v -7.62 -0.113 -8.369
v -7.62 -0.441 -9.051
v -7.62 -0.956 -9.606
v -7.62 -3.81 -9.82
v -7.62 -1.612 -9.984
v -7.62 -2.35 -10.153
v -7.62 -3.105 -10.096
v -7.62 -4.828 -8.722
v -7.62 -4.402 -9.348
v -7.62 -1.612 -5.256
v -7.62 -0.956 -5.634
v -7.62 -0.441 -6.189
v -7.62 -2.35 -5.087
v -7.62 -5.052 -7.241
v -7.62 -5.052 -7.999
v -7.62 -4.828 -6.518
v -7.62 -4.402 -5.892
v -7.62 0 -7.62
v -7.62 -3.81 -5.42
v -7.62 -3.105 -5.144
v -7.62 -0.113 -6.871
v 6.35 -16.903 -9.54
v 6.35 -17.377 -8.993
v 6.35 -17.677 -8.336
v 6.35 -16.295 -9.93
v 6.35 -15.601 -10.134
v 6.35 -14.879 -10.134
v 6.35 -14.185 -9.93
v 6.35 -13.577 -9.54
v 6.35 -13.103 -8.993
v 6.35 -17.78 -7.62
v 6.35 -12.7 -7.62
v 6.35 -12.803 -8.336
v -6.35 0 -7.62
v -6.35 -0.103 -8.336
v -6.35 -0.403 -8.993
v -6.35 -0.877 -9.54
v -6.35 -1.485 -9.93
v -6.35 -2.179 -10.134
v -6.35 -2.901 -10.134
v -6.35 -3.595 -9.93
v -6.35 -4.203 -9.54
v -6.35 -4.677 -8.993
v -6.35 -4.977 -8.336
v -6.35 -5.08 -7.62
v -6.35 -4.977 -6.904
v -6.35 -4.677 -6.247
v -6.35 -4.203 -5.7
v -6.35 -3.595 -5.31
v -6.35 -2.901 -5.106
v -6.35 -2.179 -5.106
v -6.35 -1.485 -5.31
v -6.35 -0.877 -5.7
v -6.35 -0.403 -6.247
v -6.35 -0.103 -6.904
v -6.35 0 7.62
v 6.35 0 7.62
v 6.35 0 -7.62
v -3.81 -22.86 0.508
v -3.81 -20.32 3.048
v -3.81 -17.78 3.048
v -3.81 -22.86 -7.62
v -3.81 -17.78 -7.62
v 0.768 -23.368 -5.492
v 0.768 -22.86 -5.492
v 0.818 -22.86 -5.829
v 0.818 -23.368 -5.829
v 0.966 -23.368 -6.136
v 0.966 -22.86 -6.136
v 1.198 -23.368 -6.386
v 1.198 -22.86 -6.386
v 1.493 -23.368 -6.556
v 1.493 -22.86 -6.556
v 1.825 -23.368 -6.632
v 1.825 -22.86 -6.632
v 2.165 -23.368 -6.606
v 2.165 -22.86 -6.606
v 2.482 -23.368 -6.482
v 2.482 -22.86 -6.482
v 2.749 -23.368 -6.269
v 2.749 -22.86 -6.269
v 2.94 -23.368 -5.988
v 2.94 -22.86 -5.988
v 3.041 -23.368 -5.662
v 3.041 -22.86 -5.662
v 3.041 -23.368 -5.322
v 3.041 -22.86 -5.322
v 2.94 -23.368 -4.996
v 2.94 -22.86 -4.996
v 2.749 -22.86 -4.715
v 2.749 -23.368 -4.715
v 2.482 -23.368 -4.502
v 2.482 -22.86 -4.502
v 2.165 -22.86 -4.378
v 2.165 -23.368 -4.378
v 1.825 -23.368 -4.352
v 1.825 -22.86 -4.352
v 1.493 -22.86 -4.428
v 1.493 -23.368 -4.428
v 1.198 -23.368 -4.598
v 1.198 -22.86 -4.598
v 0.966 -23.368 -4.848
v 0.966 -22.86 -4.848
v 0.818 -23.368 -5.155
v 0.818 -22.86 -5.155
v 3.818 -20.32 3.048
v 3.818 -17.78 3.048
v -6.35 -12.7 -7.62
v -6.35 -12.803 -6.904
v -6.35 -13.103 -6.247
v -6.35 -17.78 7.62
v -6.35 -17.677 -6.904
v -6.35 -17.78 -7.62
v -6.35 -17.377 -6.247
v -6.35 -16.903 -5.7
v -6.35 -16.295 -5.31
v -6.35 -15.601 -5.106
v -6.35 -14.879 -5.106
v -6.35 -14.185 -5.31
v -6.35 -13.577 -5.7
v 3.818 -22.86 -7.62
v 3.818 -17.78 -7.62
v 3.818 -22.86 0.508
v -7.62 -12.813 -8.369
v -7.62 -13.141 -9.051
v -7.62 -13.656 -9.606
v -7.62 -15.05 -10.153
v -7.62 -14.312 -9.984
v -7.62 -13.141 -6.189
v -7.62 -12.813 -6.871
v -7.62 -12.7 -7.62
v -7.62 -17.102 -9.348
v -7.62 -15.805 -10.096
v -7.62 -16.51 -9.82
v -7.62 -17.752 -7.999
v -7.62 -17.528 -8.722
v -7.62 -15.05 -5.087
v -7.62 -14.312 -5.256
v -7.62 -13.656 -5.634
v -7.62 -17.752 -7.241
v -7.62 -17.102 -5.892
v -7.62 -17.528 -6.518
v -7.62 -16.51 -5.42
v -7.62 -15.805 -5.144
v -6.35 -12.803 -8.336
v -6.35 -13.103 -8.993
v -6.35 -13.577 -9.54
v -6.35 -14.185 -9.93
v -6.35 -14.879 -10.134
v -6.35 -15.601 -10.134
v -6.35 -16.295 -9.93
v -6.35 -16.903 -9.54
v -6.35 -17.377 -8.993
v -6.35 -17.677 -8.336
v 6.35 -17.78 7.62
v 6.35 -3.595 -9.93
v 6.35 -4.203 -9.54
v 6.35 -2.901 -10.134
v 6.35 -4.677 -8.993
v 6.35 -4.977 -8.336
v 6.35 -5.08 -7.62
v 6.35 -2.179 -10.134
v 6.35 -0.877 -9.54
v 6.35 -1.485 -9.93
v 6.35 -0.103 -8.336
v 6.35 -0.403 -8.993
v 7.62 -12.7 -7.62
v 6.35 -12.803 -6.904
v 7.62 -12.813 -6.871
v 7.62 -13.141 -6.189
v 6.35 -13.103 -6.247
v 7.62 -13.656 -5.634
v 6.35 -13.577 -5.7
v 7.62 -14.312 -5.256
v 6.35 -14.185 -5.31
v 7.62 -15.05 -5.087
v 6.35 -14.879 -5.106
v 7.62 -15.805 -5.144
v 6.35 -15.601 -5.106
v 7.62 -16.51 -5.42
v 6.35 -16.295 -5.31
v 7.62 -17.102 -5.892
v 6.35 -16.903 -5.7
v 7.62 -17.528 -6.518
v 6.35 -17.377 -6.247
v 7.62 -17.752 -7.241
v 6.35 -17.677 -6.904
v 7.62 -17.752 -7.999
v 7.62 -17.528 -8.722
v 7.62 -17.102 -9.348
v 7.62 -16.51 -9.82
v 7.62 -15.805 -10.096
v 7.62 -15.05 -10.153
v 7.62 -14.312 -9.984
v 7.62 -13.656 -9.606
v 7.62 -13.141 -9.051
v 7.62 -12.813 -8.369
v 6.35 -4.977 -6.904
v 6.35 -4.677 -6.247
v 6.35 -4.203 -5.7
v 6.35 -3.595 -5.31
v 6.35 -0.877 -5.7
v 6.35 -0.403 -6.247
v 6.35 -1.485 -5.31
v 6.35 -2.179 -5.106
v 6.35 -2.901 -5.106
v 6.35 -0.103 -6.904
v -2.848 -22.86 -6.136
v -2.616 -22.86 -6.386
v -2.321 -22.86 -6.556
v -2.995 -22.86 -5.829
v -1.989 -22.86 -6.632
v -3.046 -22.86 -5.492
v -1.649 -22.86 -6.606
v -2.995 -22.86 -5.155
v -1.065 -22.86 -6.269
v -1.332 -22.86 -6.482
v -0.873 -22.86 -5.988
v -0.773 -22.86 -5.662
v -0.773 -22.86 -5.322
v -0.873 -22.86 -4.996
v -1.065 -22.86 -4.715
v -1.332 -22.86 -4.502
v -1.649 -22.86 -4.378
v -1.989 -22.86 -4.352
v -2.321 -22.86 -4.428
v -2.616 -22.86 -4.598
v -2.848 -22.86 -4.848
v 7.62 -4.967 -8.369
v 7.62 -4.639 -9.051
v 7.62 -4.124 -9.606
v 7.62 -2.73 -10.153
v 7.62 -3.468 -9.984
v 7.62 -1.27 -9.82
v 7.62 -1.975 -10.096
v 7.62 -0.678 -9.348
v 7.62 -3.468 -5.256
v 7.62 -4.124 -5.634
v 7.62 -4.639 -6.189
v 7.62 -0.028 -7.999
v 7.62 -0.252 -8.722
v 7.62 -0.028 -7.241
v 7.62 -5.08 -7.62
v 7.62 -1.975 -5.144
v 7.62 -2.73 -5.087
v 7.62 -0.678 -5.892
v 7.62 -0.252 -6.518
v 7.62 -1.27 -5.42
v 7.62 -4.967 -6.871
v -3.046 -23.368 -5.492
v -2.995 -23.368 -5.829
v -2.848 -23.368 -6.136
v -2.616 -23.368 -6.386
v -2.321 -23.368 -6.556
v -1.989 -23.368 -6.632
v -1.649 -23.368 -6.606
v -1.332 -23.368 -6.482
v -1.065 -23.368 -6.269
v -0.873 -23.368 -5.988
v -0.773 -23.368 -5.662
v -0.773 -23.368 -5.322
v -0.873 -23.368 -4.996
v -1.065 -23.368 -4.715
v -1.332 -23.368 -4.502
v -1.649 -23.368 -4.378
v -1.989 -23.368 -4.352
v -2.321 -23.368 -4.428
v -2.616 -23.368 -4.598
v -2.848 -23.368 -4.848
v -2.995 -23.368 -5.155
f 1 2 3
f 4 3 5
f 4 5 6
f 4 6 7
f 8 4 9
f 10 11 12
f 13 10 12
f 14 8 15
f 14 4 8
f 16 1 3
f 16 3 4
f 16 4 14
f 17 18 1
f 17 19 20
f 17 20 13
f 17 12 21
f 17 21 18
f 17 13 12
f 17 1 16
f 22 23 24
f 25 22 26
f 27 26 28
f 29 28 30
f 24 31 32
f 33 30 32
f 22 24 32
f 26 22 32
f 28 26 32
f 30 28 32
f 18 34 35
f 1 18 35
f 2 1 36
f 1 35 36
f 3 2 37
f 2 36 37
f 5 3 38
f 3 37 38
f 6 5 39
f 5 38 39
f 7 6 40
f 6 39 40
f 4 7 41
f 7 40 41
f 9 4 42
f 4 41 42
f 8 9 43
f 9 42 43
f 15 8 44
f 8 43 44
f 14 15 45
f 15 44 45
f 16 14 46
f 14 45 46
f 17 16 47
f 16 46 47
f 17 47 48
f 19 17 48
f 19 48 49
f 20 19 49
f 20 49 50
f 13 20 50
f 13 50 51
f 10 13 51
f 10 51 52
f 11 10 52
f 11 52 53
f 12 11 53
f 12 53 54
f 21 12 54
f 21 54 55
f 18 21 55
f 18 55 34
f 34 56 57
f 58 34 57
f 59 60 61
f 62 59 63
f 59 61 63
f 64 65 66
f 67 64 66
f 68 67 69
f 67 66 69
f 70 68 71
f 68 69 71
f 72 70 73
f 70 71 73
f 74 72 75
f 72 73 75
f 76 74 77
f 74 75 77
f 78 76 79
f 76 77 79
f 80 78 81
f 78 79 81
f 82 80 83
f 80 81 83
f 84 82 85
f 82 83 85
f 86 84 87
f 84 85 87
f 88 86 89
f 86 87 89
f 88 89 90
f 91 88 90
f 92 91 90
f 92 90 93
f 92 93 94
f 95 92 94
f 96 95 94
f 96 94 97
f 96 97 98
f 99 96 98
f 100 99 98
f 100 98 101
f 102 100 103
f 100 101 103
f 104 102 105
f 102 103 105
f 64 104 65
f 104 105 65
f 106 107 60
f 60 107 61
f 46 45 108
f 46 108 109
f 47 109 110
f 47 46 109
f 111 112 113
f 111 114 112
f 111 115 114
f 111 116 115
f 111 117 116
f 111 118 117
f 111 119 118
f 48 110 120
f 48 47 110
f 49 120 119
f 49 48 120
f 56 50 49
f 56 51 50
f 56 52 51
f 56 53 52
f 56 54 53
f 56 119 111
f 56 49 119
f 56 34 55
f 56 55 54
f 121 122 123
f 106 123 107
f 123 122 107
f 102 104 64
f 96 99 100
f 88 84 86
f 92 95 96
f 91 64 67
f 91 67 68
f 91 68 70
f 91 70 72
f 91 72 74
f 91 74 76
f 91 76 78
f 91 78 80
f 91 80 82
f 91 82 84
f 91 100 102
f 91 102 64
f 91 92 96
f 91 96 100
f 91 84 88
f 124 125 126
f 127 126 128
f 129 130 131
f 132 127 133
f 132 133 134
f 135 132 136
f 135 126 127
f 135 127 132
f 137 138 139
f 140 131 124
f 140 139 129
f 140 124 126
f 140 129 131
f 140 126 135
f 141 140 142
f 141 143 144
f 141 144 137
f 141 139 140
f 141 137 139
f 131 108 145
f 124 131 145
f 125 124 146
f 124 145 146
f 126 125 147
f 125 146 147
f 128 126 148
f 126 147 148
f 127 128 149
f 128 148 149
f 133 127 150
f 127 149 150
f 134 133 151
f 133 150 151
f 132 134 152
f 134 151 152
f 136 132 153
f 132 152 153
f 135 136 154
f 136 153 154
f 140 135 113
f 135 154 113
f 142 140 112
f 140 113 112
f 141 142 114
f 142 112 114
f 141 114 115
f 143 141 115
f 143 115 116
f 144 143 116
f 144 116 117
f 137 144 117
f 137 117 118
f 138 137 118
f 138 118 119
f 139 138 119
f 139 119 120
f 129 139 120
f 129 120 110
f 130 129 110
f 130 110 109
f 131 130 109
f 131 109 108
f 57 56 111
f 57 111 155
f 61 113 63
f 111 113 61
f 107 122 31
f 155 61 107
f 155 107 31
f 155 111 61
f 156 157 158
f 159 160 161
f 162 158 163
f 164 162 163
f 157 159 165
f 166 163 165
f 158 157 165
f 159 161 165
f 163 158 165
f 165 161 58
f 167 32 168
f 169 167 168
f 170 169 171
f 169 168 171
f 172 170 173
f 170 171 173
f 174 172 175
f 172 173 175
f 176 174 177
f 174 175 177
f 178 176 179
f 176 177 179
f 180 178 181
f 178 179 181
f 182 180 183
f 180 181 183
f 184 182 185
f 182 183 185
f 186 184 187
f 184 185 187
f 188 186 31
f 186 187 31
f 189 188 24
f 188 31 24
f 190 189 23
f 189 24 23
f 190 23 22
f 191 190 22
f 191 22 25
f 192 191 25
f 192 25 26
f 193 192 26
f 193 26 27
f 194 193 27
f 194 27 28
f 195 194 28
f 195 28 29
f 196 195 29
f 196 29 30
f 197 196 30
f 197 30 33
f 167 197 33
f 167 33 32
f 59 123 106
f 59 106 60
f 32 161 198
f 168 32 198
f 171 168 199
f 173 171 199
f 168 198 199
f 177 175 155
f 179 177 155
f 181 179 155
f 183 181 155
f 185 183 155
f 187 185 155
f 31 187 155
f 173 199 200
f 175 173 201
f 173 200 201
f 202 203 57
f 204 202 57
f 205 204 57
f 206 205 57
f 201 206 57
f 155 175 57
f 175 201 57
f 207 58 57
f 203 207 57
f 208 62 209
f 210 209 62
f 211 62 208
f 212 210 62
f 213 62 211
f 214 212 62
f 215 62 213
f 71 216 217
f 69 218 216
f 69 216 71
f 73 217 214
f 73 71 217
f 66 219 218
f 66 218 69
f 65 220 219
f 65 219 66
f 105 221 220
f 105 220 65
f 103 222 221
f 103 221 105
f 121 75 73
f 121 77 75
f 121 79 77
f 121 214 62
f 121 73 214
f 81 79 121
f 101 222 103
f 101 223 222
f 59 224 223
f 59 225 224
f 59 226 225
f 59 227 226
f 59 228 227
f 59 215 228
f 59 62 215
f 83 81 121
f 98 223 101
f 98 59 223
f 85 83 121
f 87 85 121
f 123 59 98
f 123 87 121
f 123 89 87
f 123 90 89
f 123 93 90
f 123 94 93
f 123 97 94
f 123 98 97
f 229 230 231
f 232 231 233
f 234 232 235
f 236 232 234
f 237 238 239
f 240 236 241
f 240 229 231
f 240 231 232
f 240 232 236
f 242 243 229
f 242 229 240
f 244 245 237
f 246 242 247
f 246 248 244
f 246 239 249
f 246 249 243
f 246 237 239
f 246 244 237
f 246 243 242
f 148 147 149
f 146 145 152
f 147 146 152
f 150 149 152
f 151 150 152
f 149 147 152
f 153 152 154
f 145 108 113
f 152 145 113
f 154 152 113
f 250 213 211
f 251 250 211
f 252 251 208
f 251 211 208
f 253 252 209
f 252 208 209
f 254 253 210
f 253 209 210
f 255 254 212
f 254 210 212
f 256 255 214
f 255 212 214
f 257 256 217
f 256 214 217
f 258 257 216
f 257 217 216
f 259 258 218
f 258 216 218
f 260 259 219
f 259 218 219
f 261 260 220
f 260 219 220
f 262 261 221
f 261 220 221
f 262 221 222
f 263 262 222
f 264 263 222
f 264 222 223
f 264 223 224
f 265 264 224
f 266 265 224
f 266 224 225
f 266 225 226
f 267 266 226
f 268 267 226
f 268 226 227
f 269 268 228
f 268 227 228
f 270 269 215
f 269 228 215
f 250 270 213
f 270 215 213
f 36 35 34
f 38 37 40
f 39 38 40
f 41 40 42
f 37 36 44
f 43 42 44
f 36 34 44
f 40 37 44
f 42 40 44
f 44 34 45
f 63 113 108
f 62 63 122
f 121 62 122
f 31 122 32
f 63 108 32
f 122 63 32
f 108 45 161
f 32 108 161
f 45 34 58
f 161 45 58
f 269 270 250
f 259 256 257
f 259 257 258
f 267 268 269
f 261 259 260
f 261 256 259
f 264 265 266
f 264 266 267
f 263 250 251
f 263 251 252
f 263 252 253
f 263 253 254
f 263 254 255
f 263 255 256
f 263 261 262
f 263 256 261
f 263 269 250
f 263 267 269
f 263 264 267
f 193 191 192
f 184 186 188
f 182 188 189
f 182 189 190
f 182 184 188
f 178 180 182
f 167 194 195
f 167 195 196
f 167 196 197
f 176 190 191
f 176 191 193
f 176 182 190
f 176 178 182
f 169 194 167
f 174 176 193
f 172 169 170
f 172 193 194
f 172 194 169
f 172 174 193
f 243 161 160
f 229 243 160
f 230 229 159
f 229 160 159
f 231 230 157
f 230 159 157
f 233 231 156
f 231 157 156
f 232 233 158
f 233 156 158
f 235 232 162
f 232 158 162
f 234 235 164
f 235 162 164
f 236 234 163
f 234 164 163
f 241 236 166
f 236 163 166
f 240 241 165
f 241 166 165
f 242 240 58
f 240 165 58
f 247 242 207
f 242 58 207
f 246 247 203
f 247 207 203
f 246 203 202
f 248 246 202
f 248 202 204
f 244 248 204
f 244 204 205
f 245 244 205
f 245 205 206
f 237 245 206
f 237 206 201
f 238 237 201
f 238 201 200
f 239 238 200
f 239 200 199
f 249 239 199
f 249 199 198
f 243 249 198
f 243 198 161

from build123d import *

# Parameters (mm, degrees)
F0_W     = 12.7
F0_H     = 15.24
F1_DEPTH = 17.78
F3_DEPTH = 5.08
F5_DEPTH = 1.27
F7_DEPTH = 0.508
F9_DEPTH = 1.27
F10_SIZE = 2.54


with BuildPart() as f1:
    # F0 (on Front) → F1 (new body)
    with BuildSketch(Plane.XZ):
        Rectangle(F0_W, F0_H)
    extrude(amount=F1_DEPTH)

    # F2 (on face) → F3 (join)
    with BuildSketch(Plane.XZ.offset(17.78)):
        Polygon((3.81, 3.048), (-3.81, 3.048), (-3.81, -7.62), (3.8175627124, -7.62), (3.8175627124, 3.048), align=None)
    extrude(amount=F3_DEPTH)

    # F4 (on face) → F5 (join)
    with BuildSketch(Plane(origin=(-6.35, 0, 0), x_dir=(0, -1, 0), z_dir=(-1, 0, 0))):
        with BuildLine():
            Line((0, -7.62), (5.08, -7.62))
            ThreePointArc((5.08, -7.62), (2.54, -5.08), (0, -7.62))
        make_face()
        with BuildLine():
            ThreePointArc((0, -7.62), (2.54, -10.16), (5.08, -7.62))
            Line((5.08, -7.62), (0, -7.62))
        make_face()
        with BuildLine():
            Line((12.7, -7.62), (17.78, -7.62))
            ThreePointArc((17.78, -7.62), (15.24, -5.08), (12.7, -7.62))
        make_face()
        with BuildLine():
            ThreePointArc((12.7, -7.62), (15.24, -10.16), (17.78, -7.62))
            Line((17.78, -7.62), (12.7, -7.62))
        make_face()
    extrude(amount=F5_DEPTH)

    # F6 (on face) → F7 (join)
    with BuildSketch(Plane.XZ.offset(22.86)):
        with BuildLine():
            Line((-3.0461093219, -5.4919943213), (-0.7601093219, -5.4919943213))
            ThreePointArc((-0.7601093219, -5.4919943213), (-1.9031093219, -4.3489943213), (-3.0461093219, -5.4919943213))
        make_face()
        with BuildLine():
            ThreePointArc((-3.0461093219, -5.4919943213), (-1.9031093219, -6.6349943213), (-0.7601093219, -5.4919943213))
            Line((-0.7601093219, -5.4919943213), (-3.0461093219, -5.4919943213))
        make_face()
        with BuildLine():
            ThreePointArc((3.0536720343, -5.4919943213), (1.9106720343, -4.3489943213), (0.7676720343, -5.4919943213))
            Line((0.7676720343, -5.4919943213), (3.0536720343, -5.4919943213))
        make_face()
        with BuildLine():
            Line((3.0536720343, -5.4919943213), (0.7676720343, -5.4919943213))
            ThreePointArc((0.7676720343, -5.4919943213), (1.9106720343, -6.6349943213), (3.0536720343, -5.4919943213))
        make_face()
    extrude(amount=F7_DEPTH)

    # F8 (on face) → F9 (join)
    with BuildSketch(Plane.YZ.offset(6.35)):
        with BuildLine():
            ThreePointArc((-17.78, -7.62), (-15.24, -10.16), (-12.7, -7.62))
            Line((-12.7, -7.62), (-17.78, -7.62))
        make_face()
        with BuildLine():
            Line((-17.78, -7.62), (-12.7, -7.62))
            ThreePointArc((-12.7, -7.62), (-15.24, -5.08), (-17.78, -7.62))
        make_face()
        with BuildLine():
            ThreePointArc((0, -7.62), (-2.54, -5.08), (-5.08, -7.62))
            Line((-5.08, -7.62), (0, -7.62))
        make_face()
        with BuildLine():
            Line((0, -7.62), (-5.08, -7.62))
            ThreePointArc((-5.08, -7.62), (-2.54, -10.16), (0, -7.62))
        make_face()
    extrude(amount=F9_DEPTH)

    # F10
    f10_edges = [f1.edges().sort_by_distance(p)[0] for p in [
        (0.003781, -22.86, 3.048),
    ]]
    chamfer(f10_edges, length=F10_SIZE)


solid = f1.part
